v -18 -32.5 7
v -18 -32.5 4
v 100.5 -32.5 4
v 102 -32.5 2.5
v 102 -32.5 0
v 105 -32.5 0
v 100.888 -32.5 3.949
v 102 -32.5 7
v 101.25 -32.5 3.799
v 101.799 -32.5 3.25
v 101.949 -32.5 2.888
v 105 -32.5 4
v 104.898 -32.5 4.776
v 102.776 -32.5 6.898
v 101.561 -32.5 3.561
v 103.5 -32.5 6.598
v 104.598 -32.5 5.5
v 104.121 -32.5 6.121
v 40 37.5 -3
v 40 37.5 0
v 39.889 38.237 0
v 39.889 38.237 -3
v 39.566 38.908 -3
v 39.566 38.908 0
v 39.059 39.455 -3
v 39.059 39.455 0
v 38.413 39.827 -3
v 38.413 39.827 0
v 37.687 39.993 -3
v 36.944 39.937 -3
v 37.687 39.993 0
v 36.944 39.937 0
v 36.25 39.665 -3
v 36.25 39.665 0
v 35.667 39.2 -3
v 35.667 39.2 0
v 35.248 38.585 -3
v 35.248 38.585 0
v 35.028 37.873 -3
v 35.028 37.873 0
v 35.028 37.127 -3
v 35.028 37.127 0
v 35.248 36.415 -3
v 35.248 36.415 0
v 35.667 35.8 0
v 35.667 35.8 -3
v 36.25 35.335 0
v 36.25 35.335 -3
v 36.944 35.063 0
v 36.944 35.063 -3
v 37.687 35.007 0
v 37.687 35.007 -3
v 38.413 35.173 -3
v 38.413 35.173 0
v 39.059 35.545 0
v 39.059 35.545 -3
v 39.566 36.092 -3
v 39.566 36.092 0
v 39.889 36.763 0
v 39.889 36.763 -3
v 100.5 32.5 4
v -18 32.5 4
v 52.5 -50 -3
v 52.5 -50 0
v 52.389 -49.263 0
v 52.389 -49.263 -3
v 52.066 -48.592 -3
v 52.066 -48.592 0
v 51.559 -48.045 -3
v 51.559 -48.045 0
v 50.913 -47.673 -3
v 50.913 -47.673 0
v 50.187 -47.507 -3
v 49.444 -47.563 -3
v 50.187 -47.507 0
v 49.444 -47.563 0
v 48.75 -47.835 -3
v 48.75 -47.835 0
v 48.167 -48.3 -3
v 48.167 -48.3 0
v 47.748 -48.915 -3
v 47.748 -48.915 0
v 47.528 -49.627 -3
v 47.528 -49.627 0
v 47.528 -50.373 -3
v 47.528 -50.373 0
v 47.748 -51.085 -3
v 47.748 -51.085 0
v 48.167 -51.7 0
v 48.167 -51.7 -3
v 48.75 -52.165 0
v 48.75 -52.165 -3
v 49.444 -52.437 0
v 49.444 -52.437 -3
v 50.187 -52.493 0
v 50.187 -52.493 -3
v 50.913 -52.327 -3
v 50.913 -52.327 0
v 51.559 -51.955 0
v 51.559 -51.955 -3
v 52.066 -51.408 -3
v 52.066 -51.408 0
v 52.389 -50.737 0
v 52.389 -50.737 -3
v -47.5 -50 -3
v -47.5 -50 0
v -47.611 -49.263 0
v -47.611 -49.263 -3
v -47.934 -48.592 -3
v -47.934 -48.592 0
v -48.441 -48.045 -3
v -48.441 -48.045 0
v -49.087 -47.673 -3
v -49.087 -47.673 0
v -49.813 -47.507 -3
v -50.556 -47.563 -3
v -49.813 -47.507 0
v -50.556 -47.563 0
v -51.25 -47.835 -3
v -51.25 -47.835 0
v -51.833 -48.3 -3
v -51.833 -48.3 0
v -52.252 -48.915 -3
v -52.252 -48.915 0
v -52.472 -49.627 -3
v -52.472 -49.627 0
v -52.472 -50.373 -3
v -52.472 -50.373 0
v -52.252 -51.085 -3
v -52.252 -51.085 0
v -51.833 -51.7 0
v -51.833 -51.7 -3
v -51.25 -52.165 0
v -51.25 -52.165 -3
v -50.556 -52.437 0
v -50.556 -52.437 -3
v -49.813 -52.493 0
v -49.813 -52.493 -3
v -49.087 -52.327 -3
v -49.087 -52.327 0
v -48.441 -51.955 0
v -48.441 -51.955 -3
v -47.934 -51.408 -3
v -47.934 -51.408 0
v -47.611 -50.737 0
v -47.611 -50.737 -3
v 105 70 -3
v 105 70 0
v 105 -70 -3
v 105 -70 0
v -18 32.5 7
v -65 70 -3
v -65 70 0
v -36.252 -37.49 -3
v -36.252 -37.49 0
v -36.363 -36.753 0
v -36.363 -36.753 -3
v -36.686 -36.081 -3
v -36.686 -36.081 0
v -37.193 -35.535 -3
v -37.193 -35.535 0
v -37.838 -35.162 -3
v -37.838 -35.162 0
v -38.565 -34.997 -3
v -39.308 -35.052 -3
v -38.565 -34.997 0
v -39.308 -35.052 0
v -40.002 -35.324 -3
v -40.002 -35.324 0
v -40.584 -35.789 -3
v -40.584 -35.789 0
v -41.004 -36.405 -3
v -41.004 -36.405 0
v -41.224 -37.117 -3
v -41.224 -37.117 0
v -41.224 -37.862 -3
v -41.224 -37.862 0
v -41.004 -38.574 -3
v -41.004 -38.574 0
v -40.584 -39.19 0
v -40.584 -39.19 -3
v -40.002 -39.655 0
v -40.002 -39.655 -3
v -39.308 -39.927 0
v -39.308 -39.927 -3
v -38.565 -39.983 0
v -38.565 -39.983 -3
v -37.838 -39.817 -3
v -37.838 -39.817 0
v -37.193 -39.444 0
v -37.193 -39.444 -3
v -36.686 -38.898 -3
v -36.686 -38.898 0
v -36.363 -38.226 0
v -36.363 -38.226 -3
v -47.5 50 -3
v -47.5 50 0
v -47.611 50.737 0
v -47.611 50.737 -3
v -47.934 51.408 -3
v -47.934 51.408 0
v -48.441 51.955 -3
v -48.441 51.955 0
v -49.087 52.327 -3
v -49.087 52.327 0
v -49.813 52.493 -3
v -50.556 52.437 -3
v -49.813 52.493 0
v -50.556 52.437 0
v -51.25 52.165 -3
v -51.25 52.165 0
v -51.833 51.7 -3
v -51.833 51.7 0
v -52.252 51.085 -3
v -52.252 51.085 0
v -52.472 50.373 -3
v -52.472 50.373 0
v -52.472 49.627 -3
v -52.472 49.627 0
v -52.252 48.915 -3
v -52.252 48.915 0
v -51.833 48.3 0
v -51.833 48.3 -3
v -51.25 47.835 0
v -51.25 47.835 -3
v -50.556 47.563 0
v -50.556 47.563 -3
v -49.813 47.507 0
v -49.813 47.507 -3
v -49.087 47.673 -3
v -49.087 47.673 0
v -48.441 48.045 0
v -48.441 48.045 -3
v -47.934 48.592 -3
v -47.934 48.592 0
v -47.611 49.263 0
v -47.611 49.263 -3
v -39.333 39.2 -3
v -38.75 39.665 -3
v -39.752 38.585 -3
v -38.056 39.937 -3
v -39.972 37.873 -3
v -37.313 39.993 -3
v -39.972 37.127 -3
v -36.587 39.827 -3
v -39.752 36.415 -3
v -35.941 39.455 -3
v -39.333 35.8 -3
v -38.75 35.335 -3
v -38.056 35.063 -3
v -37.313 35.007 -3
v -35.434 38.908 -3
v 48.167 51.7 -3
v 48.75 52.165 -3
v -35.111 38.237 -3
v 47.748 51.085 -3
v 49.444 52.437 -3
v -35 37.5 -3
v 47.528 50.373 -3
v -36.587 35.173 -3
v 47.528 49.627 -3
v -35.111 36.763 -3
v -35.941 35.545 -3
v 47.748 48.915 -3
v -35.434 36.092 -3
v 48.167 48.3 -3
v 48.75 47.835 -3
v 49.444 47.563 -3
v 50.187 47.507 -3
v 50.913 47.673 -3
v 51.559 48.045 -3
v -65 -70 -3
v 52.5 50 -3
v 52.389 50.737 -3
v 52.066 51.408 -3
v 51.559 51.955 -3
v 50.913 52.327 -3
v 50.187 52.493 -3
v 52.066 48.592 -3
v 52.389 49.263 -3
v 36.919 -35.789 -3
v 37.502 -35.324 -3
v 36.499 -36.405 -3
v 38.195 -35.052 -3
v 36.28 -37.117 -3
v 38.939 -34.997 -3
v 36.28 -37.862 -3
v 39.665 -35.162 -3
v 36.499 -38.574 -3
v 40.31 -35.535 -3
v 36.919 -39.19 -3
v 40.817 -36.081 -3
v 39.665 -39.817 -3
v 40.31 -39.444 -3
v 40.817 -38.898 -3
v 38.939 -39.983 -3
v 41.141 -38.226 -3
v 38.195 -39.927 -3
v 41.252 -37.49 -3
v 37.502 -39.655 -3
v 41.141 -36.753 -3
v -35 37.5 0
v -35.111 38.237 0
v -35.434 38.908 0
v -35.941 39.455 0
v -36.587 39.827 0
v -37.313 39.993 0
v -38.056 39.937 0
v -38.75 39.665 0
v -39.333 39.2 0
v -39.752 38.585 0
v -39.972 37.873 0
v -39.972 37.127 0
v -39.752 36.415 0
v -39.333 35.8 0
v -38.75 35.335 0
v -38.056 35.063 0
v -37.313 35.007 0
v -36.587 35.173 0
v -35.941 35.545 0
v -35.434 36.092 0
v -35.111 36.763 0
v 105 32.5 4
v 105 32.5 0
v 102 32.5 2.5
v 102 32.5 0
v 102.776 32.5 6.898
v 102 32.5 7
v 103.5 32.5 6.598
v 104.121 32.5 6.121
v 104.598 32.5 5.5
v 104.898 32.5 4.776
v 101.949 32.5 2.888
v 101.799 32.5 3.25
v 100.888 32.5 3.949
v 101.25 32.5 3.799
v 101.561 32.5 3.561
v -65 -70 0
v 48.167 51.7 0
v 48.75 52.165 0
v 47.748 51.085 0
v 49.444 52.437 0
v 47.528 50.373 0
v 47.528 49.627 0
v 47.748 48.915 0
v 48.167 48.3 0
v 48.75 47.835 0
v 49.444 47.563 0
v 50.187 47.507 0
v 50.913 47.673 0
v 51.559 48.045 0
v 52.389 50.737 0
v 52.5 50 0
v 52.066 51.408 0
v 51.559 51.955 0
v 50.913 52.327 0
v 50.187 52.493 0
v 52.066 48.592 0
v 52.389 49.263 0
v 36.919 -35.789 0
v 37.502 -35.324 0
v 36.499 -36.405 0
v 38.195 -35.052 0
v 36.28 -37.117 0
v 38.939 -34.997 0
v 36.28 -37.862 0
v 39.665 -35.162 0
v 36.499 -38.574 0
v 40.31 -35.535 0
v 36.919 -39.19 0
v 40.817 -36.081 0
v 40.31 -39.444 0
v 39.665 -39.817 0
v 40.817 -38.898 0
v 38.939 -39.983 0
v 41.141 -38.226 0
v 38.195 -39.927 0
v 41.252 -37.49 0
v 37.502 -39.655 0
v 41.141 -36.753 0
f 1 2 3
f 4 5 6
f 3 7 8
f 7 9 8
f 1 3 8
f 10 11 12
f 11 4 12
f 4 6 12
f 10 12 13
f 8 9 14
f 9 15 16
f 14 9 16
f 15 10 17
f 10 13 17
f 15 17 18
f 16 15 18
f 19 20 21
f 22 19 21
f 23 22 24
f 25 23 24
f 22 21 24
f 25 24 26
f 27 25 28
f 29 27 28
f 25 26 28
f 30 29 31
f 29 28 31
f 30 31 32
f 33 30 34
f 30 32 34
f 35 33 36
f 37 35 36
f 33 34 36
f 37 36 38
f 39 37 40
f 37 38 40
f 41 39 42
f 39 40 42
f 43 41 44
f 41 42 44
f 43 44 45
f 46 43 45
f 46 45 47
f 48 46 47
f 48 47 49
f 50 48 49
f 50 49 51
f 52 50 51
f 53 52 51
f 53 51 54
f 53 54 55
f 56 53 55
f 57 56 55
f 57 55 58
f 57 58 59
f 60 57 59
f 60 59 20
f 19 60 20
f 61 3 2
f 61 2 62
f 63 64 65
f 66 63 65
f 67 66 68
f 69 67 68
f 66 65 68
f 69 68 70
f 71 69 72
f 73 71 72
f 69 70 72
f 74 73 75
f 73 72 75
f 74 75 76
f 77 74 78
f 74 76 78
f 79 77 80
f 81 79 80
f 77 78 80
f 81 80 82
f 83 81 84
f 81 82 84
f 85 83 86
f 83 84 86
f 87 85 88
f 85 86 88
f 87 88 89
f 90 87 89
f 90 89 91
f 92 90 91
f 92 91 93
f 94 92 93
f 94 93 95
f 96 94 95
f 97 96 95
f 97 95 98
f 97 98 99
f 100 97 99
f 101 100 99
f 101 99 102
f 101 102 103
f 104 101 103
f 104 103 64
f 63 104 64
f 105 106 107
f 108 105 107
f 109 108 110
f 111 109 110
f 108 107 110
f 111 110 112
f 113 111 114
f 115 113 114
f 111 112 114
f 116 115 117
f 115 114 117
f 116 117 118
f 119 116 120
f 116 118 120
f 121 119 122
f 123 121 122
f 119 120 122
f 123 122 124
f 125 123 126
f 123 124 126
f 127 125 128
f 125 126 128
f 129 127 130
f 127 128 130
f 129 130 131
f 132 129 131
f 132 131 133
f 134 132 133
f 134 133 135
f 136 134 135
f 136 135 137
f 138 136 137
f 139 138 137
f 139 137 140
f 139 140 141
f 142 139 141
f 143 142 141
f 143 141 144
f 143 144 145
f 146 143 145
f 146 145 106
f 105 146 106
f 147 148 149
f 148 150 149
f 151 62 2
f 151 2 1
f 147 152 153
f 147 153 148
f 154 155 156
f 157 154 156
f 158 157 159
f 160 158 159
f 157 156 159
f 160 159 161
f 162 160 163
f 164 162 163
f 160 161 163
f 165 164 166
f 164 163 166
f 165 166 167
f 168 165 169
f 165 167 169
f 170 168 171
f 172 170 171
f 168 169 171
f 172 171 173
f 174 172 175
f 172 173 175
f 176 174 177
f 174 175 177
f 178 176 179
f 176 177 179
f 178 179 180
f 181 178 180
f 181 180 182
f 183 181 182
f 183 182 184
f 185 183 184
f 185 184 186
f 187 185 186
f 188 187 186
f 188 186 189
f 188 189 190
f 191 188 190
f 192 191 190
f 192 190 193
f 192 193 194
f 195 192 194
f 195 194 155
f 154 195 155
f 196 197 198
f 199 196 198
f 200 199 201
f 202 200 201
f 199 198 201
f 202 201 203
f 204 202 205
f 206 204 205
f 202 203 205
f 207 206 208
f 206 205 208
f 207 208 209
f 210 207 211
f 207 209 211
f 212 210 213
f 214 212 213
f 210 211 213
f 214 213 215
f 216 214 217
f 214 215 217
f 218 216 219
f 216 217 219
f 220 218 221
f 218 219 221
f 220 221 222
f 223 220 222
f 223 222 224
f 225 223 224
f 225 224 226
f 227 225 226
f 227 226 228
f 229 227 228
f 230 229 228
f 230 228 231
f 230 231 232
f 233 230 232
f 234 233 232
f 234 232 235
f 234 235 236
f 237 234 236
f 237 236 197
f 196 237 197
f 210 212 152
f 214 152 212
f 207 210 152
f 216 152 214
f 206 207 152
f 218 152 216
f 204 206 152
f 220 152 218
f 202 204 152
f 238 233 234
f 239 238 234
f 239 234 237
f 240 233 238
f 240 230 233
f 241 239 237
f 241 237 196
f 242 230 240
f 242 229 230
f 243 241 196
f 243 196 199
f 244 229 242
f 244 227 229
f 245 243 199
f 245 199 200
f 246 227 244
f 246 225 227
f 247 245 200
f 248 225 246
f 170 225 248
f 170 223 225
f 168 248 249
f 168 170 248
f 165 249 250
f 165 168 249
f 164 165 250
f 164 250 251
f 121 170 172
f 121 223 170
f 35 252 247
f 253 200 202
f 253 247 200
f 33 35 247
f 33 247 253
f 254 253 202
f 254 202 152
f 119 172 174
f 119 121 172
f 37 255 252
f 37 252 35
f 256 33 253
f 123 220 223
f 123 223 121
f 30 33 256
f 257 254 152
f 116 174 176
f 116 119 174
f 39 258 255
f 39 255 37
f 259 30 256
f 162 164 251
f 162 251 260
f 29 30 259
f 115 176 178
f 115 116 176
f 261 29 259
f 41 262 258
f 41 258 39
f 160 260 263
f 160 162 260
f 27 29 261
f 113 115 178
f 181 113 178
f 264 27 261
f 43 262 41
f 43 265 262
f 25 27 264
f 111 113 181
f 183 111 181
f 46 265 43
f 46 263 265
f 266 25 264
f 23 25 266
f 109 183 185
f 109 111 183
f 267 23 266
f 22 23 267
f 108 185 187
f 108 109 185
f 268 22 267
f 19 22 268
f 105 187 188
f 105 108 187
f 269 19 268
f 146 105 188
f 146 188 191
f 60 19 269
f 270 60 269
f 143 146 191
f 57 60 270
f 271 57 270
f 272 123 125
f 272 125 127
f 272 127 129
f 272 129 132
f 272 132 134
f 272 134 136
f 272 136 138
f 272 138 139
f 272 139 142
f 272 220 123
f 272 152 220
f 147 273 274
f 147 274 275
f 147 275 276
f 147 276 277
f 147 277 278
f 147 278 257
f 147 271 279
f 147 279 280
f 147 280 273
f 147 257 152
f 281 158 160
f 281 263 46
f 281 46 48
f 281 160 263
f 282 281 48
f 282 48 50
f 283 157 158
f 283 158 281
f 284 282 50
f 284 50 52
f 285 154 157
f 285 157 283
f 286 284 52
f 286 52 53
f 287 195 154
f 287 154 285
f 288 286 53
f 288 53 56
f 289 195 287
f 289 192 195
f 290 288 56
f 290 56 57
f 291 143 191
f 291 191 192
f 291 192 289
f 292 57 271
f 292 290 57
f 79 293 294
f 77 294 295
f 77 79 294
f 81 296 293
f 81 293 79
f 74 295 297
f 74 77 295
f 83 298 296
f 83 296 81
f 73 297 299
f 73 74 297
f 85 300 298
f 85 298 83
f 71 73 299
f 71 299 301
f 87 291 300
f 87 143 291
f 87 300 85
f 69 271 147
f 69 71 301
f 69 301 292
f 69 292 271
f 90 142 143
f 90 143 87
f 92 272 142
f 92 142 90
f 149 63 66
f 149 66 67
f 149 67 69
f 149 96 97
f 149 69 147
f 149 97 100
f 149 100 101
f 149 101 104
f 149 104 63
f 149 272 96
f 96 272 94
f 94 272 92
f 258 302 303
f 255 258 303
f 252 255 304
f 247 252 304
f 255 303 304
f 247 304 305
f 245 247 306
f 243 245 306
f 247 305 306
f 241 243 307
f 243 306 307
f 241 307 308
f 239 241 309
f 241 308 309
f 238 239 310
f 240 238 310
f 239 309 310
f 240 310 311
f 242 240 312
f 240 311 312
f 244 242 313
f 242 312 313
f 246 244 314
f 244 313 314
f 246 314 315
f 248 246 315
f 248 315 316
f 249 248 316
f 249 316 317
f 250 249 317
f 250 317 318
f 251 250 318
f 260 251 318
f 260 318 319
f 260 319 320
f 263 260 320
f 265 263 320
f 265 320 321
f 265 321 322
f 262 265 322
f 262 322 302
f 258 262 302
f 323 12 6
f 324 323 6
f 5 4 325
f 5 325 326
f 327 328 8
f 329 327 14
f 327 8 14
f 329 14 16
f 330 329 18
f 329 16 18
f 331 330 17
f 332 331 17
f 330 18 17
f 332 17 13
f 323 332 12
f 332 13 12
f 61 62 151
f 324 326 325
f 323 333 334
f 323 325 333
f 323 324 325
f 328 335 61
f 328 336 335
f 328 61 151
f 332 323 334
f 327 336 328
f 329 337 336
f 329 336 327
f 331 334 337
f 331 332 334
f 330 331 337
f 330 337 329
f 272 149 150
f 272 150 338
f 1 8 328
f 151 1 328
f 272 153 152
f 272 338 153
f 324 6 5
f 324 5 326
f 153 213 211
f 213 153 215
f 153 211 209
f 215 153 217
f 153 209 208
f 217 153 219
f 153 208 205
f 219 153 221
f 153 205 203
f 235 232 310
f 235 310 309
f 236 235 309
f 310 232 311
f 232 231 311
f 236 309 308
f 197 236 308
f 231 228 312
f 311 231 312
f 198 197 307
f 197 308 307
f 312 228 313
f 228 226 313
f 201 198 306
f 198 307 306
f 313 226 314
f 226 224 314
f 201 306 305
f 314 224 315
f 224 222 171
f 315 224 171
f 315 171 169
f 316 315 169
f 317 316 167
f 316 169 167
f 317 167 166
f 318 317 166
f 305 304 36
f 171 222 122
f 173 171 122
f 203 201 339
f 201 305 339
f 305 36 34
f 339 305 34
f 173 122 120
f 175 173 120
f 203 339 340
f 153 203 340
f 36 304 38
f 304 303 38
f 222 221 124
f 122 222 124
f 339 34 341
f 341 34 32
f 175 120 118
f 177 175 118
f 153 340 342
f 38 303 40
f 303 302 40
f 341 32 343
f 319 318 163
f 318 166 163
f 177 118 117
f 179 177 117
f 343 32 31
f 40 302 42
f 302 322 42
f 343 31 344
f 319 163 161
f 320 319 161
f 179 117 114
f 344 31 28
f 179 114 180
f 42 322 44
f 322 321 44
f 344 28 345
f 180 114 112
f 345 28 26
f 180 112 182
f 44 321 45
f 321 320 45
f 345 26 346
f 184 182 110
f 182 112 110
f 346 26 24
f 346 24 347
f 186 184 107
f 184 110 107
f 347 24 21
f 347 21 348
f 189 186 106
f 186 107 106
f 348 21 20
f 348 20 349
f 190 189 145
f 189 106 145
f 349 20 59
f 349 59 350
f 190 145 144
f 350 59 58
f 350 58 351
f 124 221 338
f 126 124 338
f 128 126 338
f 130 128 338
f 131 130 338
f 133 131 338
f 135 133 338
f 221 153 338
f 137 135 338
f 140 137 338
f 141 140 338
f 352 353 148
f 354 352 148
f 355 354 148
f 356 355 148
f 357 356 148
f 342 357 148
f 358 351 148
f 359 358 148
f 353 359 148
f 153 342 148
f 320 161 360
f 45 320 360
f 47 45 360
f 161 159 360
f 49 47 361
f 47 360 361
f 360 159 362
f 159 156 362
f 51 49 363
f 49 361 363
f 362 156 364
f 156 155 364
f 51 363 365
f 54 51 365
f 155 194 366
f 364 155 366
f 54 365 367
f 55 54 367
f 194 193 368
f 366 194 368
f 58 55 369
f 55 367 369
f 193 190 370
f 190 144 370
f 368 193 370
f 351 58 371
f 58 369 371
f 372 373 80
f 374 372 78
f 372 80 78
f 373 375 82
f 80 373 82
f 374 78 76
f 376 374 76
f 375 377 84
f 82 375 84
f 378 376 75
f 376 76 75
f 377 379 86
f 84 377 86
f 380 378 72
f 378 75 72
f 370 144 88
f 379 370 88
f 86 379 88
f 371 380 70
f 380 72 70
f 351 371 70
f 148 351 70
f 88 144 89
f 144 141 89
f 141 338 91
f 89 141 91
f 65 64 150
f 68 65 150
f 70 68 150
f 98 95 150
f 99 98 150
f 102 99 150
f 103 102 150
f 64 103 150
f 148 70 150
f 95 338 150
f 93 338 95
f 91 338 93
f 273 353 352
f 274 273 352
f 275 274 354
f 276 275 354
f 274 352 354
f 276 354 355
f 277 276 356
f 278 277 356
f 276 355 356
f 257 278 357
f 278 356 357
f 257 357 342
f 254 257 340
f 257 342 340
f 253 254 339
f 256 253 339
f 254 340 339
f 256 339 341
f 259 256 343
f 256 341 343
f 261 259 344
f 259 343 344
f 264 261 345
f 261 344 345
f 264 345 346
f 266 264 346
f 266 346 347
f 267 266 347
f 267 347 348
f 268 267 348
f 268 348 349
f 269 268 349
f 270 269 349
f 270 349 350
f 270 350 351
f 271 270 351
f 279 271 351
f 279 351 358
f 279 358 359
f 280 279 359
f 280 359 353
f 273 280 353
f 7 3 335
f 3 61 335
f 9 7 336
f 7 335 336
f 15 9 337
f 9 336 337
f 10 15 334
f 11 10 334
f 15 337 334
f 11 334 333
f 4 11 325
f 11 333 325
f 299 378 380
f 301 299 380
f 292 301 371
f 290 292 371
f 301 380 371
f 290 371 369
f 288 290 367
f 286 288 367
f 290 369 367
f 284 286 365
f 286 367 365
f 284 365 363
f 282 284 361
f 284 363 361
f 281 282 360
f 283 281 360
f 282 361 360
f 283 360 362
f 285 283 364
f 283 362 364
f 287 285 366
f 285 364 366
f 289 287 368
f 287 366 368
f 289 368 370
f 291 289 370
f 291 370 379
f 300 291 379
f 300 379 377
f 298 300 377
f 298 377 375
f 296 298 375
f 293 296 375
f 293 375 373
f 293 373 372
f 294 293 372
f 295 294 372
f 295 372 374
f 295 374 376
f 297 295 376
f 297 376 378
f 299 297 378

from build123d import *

# Parameters (mm, degrees)
SKETCH1_W            = 150
SKETCH1_H            = 150
BASE_FLANGE1_DEPTH   = 3
SKETCH23_W           = 150
SKETCH23_H           = 150
SKETCH23_W_2         = 140
SKETCH23_H_2         = 140
BOSS_EXTRUDE3_DEPTH  = 20
SKETCH27_W           = 7
SKETCH27_H           = 150
BOSS_EXTRUDE4_DEPTH  = 20
SKETCH31_R           = 2.5
CUT_EXTRUDE1_DEPTH   = 20
SKETCH33_W           = 170
SKETCH33_H           = 150
CUT_EXTRUDE3_DEPTH   = 20
SKETCH34_W           = 150
SKETCH34_H           = 150
SKETCH34_W_2         = 130
SKETCH34_H_2         = 130
CUT_EXTRUDE4_DEPTH   = 20
SKETCH39_W           = 40
SKETCH39_H           = 130
BOSS_EXTRUDE11_DEPTH = 3
BOSS_EXTRUDE14_DEPTH = 3
SKETCH47_W           = 3
SKETCH47_H           = 65
BOSS_EXTRUDE15_DEPTH = 120
FILLET3_R            = 1.5
FILLET4_R            = 3
SKETCH48_W           = 170
SKETCH48_H           = 3
BOSS_EXTRUDE16_DEPTH = 5
SKETCH49_W           = 170
SKETCH49_H           = 3
BOSS_EXTRUDE17_DEPTH = 5


# Sheet-metal steps are written as plain solids
with BuildPart() as part:
    # Sketch1 → Base-Flange1 (new body)
    with BuildSketch(Plane.XY):
        Rectangle(SKETCH1_W, SKETCH1_H)
    extrude(amount=-BASE_FLANGE1_DEPTH)

    # Sketch23 → Boss-Extrude3 (add)
    with BuildSketch(Plane(origin=(0, 0, -3), x_dir=(-1, 0, 0), z_dir=(0, 0, -1))):
        Rectangle(SKETCH23_W, SKETCH23_H)
        Rectangle(SKETCH23_W_2, SKETCH23_H_2, mode=Mode.SUBTRACT)
    extrude(amount=BOSS_EXTRUDE3_DEPTH)

    # Sketch27 → Boss-Extrude4 (add)
    with BuildSketch(Plane(origin=(75, 0, 0), x_dir=(0, 0, -1), z_dir=(1, 0, 0))):
        with Locations((19.5, 0)):
            Rectangle(SKETCH27_W, SKETCH27_H)
    extrude(amount=BOSS_EXTRUDE4_DEPTH)

    # Sketch31 → Cut-Extrude1 (cut)
    with BuildSketch(Plane.XY):
        with Locations((-50, -50)):
            Circle(SKETCH31_R)
        with Locations((-50, 50)):
            Circle(SKETCH31_R)
        with Locations((50, 50)):
            Circle(SKETCH31_R)
        with Locations((50, -50)):
            Circle(SKETCH31_R)
        with Locations((37.5, 37.5)):
            Circle(SKETCH31_R)
        with Locations((-37.5, 37.5)):
            Circle(SKETCH31_R)
        with Locations((38.751749061, -37.489553434)):
            Circle(SKETCH31_R)
        with Locations((-38.751749061, -37.489553434)):
            Circle(SKETCH31_R)
    extrude(amount=-CUT_EXTRUDE1_DEPTH, mode=Mode.SUBTRACT)

    # Sketch33 → Cut-Extrude3 (cut)
    with BuildSketch(Plane(origin=(0, 0, -23), x_dir=(-1, 0, 0), z_dir=(0, 0, -1))):
        with Locations((-10, 0)):
            Rectangle(SKETCH33_W, SKETCH33_H)
    extrude(amount=-CUT_EXTRUDE3_DEPTH, mode=Mode.SUBTRACT)

    # Sketch34 → Cut-Extrude4 (cut)
    with BuildSketch(Plane.XY):
        Rectangle(SKETCH34_W, SKETCH34_H)
        Rectangle(SKETCH34_W_2, SKETCH34_H_2, mode=Mode.SUBTRACT)
    extrude(amount=-CUT_EXTRUDE4_DEPTH, mode=Mode.SUBTRACT)

    # Sketch39 → Boss-Extrude11 (add)
    with BuildSketch(Plane.XY):
        with Locations((85, 0)):
            Rectangle(SKETCH39_W, SKETCH39_H)
    extrude(amount=-BOSS_EXTRUDE11_DEPTH)

    # Sketch48 → Boss-Extrude16 (add)
    with BuildSketch(Plane(origin=(0, -65, 0), x_dir=(-1, 0, 0), z_dir=(0, -1, 0))):
        with Locations((-20, 1.5)):
            Rectangle(SKETCH48_W, SKETCH48_H)
    extrude(amount=BOSS_EXTRUDE16_DEPTH)

    # Sketch49 → Boss-Extrude17 (add)
    with BuildSketch(Plane(origin=(0, 65, 0), x_dir=(1, 0, 0), z_dir=(0, 1, 0))):
        with Locations((20, 1.5)):
            Rectangle(SKETCH49_W, SKETCH49_H)
    extrude(amount=BOSS_EXTRUDE17_DEPTH)


with BuildPart() as body_2:
    # Sketch46 → Boss-Extrude14 (new body)
    with BuildSketch(Plane(origin=(105, 0, 0), x_dir=(0, 0, -1), z_dir=(1, 0, 0))):
        Polygon((0, 0), (0, 32.5), (-7, 32.5), (-7, -32.5), (0, -32.5), align=None)
    extrude(amount=-BOSS_EXTRUDE14_DEPTH)

    # Sketch47 → Boss-Extrude15 (add)
    with BuildSketch(Plane.ZY.offset(-102)):
        with Locations((5.5, 0)):
            Rectangle(SKETCH47_W, SKETCH47_H)
    extrude(amount=BOSS_EXTRUDE15_DEPTH)

    # Fillet3
    fillet3_edges = [body_2.edges().sort_by_distance(p)[0] for p in [
        (102, 0, 4),
    ]]
    fillet(fillet3_edges, radius=FILLET3_R)

    # Fillet4
    fillet4_edges = [body_2.edges().sort_by_distance(p)[0] for p in [
        (105, 0, 7),
    ]]
    fillet(fillet4_edges, radius=FILLET4_R)


solid = Compound([part.part, body_2.part])
